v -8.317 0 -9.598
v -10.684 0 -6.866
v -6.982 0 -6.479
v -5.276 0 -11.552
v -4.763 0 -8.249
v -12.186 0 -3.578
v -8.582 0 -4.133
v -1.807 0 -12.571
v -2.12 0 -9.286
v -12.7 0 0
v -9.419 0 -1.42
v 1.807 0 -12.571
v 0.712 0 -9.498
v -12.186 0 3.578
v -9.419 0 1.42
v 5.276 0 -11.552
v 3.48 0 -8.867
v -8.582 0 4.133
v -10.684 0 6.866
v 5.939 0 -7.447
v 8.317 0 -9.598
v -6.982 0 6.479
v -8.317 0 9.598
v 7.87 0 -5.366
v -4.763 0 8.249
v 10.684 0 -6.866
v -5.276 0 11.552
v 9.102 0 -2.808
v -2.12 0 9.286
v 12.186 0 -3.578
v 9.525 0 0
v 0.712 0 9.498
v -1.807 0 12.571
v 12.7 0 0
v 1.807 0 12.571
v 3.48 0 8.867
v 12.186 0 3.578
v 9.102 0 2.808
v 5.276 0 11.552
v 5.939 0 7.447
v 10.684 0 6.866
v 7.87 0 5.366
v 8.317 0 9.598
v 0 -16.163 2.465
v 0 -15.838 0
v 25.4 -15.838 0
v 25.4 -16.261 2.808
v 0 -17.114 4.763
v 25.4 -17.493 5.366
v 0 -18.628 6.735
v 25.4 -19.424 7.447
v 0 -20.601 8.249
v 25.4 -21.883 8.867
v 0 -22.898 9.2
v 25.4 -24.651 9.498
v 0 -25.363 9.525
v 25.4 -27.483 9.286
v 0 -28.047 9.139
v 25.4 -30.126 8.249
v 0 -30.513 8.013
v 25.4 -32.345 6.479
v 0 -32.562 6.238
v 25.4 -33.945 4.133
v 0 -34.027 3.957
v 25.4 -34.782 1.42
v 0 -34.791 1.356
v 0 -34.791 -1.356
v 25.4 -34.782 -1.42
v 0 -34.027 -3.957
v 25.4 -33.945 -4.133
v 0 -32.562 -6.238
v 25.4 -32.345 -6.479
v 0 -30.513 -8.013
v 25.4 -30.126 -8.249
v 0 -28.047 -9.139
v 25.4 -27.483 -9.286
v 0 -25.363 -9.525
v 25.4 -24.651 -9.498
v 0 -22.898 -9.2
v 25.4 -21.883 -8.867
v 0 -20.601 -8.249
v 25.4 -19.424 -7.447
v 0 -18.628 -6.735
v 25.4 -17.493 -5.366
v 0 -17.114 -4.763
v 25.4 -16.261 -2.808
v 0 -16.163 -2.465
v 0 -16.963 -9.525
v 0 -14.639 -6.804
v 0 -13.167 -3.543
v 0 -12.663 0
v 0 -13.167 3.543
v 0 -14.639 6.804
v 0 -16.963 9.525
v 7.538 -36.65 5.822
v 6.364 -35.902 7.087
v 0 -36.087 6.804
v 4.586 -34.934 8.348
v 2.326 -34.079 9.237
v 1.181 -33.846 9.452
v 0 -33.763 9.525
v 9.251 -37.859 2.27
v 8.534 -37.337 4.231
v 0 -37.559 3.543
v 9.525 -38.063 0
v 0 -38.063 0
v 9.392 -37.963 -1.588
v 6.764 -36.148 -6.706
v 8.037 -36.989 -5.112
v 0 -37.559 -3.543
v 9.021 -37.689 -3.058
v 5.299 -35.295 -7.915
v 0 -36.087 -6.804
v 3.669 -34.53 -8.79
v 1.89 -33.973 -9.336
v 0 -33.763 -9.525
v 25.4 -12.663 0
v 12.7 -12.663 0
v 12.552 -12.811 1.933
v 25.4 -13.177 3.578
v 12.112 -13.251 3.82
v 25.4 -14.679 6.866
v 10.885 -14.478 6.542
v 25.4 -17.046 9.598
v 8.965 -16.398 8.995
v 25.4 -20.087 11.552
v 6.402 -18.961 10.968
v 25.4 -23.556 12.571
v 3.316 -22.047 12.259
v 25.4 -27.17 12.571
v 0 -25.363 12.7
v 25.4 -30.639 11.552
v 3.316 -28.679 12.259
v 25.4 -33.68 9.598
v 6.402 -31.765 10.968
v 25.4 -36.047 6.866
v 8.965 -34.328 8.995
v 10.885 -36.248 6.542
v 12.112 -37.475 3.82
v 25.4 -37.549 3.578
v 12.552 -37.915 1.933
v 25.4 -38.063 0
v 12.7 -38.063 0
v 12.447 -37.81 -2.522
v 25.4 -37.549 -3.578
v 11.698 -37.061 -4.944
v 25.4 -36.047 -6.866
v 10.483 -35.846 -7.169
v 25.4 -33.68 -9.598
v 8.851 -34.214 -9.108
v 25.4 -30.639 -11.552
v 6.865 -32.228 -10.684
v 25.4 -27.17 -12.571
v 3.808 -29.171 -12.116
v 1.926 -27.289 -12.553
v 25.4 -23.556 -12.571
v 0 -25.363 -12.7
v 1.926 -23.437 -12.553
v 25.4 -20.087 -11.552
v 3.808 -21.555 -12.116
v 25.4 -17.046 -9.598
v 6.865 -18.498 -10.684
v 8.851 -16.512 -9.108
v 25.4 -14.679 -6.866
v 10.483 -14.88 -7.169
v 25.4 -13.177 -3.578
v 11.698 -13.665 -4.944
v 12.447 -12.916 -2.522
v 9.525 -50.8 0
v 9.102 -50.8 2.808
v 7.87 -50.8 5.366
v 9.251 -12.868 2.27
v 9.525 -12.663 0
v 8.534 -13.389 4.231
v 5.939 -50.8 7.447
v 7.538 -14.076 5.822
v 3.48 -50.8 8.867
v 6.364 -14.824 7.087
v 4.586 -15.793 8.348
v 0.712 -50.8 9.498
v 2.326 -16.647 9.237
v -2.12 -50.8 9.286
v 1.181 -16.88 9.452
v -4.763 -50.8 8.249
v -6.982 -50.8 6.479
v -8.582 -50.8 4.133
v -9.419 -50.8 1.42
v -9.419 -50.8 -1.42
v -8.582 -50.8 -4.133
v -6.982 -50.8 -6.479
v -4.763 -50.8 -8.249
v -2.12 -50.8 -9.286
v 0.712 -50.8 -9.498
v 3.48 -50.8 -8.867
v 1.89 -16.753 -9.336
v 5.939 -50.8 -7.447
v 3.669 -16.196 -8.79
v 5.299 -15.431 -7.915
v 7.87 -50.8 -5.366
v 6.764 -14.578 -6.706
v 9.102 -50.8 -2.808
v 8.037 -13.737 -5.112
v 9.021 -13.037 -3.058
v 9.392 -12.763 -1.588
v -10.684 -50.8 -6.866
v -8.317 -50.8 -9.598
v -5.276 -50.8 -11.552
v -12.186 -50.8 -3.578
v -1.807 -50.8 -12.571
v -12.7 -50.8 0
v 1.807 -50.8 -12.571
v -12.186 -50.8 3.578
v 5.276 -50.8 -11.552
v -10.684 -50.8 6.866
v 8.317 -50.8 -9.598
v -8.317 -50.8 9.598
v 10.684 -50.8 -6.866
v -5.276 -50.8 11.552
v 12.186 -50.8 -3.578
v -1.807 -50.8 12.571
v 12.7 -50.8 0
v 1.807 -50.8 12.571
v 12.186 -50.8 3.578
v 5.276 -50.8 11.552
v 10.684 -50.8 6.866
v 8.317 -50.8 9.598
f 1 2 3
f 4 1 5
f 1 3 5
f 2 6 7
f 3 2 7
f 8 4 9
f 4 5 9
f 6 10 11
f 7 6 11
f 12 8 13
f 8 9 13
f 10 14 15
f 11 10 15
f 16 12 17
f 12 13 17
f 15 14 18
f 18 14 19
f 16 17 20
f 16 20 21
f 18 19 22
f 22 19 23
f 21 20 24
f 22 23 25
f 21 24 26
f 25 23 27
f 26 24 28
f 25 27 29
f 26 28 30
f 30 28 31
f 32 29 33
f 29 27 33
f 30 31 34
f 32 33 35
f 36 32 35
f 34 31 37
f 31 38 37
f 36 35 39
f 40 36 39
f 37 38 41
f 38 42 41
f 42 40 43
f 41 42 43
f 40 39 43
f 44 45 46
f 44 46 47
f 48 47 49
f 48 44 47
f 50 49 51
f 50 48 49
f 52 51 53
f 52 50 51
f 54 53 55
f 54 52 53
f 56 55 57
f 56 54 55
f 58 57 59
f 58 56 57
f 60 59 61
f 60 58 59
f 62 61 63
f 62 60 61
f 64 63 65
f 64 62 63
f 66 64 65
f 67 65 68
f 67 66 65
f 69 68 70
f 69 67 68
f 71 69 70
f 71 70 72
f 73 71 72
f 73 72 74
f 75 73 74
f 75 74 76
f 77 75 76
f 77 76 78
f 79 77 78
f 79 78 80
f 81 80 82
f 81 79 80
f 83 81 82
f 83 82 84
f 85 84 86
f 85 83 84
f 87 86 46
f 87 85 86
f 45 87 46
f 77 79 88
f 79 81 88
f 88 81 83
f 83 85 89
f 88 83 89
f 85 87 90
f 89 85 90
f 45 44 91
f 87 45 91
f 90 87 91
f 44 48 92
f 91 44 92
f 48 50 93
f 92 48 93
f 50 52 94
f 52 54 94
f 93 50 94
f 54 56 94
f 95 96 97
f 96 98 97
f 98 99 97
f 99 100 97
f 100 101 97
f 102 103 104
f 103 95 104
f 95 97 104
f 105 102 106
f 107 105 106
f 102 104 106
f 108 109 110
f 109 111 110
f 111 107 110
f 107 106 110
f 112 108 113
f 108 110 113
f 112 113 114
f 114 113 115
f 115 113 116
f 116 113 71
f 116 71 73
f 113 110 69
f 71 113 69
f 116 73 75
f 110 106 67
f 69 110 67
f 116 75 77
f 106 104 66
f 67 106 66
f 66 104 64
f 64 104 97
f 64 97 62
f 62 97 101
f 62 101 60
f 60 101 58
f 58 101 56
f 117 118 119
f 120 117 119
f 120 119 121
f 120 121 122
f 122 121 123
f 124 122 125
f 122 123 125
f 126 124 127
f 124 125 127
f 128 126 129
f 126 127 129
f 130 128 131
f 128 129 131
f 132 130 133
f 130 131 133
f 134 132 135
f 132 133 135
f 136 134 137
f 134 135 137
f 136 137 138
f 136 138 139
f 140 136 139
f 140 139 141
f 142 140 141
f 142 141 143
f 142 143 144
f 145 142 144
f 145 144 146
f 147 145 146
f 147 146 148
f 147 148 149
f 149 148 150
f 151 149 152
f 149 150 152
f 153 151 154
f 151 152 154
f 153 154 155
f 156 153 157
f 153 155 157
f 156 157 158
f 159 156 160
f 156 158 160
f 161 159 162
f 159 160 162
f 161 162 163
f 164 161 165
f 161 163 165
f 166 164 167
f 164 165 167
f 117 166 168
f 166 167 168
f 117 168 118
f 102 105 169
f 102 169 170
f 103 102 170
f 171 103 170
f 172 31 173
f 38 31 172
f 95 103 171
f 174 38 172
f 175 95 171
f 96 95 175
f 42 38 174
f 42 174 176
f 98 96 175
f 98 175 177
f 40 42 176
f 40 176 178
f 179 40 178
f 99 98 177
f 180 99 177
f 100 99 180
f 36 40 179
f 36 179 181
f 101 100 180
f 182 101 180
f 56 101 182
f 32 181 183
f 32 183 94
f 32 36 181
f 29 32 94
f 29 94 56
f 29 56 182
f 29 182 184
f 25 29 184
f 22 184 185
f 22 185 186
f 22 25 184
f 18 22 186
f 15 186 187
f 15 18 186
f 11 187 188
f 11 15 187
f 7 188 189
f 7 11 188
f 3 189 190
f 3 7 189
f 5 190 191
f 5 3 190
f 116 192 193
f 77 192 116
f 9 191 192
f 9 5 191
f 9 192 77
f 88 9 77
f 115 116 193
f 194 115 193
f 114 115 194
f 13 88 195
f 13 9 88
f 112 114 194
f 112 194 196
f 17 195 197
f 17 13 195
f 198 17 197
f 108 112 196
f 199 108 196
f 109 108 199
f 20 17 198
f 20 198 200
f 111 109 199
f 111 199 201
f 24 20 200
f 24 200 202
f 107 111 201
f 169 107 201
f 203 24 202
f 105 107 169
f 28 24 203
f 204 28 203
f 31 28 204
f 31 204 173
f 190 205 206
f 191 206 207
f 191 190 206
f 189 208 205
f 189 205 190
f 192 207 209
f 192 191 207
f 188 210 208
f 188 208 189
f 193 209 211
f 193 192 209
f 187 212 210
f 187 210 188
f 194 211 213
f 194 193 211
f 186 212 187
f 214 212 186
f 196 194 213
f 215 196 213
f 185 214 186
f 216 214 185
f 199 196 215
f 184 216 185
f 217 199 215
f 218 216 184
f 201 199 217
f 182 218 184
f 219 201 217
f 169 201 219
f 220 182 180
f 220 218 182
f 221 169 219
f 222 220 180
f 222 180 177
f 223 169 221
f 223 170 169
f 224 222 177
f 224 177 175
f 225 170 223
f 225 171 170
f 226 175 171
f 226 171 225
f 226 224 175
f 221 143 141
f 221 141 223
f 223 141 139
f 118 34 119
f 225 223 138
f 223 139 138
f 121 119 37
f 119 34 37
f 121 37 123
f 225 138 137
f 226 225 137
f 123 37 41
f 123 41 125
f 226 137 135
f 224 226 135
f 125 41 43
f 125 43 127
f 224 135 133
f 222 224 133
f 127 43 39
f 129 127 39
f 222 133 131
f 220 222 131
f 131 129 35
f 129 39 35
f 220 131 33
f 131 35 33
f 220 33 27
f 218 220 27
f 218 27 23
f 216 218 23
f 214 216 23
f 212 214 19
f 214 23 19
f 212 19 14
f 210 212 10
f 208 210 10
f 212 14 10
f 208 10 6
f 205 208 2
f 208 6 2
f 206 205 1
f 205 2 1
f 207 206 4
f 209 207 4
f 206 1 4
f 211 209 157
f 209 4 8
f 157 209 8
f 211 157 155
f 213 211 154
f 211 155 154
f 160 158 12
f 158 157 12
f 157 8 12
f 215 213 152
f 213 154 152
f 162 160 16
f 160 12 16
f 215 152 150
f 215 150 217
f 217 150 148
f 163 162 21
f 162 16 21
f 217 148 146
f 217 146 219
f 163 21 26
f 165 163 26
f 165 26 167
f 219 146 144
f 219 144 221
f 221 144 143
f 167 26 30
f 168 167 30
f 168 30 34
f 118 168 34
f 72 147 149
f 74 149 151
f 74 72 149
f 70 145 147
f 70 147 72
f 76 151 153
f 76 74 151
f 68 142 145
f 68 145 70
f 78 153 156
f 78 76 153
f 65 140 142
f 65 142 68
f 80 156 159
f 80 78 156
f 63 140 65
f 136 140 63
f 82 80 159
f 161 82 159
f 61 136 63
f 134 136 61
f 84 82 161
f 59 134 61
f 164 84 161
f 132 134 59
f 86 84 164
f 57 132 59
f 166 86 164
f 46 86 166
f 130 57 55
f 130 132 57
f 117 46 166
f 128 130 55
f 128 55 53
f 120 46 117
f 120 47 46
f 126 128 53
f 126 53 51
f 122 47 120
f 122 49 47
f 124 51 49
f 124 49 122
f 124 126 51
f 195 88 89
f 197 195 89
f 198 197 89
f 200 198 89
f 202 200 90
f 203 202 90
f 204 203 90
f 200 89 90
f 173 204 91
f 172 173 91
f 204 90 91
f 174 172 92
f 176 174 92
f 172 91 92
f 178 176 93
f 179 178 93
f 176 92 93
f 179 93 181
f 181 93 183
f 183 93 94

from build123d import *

# Parameters (mm, degrees)
F0_R     = 12.7
F0_R_2   = 9.525
F1_DEPTH = 50.8
F2_R     = 12.7
F4_DEPTH = 25.4
F3_R     = 9.525
F5_DEPTH = 25.4


with BuildPart() as f1:
    # F0 (on Front) → F1 (new body)
    with BuildSketch(Plane.XZ):
        Circle(F0_R)
        Circle(F0_R_2, mode=Mode.SUBTRACT)
    extrude(amount=F1_DEPTH)

    # F2 (on Right) → F4 (join)
    with BuildSketch(Plane.YZ):
        with Locations((-25.363049, 0)):
            Circle(F2_R)
    extrude(amount=F4_DEPTH)

    # F3 (on Right) → F5 (cut)
    with BuildSketch(Plane.YZ):
        with Locations((-25.363049, 0)):
            Circle(F3_R)
    extrude(amount=F5_DEPTH, mode=Mode.SUBTRACT)


solid = f1.part
